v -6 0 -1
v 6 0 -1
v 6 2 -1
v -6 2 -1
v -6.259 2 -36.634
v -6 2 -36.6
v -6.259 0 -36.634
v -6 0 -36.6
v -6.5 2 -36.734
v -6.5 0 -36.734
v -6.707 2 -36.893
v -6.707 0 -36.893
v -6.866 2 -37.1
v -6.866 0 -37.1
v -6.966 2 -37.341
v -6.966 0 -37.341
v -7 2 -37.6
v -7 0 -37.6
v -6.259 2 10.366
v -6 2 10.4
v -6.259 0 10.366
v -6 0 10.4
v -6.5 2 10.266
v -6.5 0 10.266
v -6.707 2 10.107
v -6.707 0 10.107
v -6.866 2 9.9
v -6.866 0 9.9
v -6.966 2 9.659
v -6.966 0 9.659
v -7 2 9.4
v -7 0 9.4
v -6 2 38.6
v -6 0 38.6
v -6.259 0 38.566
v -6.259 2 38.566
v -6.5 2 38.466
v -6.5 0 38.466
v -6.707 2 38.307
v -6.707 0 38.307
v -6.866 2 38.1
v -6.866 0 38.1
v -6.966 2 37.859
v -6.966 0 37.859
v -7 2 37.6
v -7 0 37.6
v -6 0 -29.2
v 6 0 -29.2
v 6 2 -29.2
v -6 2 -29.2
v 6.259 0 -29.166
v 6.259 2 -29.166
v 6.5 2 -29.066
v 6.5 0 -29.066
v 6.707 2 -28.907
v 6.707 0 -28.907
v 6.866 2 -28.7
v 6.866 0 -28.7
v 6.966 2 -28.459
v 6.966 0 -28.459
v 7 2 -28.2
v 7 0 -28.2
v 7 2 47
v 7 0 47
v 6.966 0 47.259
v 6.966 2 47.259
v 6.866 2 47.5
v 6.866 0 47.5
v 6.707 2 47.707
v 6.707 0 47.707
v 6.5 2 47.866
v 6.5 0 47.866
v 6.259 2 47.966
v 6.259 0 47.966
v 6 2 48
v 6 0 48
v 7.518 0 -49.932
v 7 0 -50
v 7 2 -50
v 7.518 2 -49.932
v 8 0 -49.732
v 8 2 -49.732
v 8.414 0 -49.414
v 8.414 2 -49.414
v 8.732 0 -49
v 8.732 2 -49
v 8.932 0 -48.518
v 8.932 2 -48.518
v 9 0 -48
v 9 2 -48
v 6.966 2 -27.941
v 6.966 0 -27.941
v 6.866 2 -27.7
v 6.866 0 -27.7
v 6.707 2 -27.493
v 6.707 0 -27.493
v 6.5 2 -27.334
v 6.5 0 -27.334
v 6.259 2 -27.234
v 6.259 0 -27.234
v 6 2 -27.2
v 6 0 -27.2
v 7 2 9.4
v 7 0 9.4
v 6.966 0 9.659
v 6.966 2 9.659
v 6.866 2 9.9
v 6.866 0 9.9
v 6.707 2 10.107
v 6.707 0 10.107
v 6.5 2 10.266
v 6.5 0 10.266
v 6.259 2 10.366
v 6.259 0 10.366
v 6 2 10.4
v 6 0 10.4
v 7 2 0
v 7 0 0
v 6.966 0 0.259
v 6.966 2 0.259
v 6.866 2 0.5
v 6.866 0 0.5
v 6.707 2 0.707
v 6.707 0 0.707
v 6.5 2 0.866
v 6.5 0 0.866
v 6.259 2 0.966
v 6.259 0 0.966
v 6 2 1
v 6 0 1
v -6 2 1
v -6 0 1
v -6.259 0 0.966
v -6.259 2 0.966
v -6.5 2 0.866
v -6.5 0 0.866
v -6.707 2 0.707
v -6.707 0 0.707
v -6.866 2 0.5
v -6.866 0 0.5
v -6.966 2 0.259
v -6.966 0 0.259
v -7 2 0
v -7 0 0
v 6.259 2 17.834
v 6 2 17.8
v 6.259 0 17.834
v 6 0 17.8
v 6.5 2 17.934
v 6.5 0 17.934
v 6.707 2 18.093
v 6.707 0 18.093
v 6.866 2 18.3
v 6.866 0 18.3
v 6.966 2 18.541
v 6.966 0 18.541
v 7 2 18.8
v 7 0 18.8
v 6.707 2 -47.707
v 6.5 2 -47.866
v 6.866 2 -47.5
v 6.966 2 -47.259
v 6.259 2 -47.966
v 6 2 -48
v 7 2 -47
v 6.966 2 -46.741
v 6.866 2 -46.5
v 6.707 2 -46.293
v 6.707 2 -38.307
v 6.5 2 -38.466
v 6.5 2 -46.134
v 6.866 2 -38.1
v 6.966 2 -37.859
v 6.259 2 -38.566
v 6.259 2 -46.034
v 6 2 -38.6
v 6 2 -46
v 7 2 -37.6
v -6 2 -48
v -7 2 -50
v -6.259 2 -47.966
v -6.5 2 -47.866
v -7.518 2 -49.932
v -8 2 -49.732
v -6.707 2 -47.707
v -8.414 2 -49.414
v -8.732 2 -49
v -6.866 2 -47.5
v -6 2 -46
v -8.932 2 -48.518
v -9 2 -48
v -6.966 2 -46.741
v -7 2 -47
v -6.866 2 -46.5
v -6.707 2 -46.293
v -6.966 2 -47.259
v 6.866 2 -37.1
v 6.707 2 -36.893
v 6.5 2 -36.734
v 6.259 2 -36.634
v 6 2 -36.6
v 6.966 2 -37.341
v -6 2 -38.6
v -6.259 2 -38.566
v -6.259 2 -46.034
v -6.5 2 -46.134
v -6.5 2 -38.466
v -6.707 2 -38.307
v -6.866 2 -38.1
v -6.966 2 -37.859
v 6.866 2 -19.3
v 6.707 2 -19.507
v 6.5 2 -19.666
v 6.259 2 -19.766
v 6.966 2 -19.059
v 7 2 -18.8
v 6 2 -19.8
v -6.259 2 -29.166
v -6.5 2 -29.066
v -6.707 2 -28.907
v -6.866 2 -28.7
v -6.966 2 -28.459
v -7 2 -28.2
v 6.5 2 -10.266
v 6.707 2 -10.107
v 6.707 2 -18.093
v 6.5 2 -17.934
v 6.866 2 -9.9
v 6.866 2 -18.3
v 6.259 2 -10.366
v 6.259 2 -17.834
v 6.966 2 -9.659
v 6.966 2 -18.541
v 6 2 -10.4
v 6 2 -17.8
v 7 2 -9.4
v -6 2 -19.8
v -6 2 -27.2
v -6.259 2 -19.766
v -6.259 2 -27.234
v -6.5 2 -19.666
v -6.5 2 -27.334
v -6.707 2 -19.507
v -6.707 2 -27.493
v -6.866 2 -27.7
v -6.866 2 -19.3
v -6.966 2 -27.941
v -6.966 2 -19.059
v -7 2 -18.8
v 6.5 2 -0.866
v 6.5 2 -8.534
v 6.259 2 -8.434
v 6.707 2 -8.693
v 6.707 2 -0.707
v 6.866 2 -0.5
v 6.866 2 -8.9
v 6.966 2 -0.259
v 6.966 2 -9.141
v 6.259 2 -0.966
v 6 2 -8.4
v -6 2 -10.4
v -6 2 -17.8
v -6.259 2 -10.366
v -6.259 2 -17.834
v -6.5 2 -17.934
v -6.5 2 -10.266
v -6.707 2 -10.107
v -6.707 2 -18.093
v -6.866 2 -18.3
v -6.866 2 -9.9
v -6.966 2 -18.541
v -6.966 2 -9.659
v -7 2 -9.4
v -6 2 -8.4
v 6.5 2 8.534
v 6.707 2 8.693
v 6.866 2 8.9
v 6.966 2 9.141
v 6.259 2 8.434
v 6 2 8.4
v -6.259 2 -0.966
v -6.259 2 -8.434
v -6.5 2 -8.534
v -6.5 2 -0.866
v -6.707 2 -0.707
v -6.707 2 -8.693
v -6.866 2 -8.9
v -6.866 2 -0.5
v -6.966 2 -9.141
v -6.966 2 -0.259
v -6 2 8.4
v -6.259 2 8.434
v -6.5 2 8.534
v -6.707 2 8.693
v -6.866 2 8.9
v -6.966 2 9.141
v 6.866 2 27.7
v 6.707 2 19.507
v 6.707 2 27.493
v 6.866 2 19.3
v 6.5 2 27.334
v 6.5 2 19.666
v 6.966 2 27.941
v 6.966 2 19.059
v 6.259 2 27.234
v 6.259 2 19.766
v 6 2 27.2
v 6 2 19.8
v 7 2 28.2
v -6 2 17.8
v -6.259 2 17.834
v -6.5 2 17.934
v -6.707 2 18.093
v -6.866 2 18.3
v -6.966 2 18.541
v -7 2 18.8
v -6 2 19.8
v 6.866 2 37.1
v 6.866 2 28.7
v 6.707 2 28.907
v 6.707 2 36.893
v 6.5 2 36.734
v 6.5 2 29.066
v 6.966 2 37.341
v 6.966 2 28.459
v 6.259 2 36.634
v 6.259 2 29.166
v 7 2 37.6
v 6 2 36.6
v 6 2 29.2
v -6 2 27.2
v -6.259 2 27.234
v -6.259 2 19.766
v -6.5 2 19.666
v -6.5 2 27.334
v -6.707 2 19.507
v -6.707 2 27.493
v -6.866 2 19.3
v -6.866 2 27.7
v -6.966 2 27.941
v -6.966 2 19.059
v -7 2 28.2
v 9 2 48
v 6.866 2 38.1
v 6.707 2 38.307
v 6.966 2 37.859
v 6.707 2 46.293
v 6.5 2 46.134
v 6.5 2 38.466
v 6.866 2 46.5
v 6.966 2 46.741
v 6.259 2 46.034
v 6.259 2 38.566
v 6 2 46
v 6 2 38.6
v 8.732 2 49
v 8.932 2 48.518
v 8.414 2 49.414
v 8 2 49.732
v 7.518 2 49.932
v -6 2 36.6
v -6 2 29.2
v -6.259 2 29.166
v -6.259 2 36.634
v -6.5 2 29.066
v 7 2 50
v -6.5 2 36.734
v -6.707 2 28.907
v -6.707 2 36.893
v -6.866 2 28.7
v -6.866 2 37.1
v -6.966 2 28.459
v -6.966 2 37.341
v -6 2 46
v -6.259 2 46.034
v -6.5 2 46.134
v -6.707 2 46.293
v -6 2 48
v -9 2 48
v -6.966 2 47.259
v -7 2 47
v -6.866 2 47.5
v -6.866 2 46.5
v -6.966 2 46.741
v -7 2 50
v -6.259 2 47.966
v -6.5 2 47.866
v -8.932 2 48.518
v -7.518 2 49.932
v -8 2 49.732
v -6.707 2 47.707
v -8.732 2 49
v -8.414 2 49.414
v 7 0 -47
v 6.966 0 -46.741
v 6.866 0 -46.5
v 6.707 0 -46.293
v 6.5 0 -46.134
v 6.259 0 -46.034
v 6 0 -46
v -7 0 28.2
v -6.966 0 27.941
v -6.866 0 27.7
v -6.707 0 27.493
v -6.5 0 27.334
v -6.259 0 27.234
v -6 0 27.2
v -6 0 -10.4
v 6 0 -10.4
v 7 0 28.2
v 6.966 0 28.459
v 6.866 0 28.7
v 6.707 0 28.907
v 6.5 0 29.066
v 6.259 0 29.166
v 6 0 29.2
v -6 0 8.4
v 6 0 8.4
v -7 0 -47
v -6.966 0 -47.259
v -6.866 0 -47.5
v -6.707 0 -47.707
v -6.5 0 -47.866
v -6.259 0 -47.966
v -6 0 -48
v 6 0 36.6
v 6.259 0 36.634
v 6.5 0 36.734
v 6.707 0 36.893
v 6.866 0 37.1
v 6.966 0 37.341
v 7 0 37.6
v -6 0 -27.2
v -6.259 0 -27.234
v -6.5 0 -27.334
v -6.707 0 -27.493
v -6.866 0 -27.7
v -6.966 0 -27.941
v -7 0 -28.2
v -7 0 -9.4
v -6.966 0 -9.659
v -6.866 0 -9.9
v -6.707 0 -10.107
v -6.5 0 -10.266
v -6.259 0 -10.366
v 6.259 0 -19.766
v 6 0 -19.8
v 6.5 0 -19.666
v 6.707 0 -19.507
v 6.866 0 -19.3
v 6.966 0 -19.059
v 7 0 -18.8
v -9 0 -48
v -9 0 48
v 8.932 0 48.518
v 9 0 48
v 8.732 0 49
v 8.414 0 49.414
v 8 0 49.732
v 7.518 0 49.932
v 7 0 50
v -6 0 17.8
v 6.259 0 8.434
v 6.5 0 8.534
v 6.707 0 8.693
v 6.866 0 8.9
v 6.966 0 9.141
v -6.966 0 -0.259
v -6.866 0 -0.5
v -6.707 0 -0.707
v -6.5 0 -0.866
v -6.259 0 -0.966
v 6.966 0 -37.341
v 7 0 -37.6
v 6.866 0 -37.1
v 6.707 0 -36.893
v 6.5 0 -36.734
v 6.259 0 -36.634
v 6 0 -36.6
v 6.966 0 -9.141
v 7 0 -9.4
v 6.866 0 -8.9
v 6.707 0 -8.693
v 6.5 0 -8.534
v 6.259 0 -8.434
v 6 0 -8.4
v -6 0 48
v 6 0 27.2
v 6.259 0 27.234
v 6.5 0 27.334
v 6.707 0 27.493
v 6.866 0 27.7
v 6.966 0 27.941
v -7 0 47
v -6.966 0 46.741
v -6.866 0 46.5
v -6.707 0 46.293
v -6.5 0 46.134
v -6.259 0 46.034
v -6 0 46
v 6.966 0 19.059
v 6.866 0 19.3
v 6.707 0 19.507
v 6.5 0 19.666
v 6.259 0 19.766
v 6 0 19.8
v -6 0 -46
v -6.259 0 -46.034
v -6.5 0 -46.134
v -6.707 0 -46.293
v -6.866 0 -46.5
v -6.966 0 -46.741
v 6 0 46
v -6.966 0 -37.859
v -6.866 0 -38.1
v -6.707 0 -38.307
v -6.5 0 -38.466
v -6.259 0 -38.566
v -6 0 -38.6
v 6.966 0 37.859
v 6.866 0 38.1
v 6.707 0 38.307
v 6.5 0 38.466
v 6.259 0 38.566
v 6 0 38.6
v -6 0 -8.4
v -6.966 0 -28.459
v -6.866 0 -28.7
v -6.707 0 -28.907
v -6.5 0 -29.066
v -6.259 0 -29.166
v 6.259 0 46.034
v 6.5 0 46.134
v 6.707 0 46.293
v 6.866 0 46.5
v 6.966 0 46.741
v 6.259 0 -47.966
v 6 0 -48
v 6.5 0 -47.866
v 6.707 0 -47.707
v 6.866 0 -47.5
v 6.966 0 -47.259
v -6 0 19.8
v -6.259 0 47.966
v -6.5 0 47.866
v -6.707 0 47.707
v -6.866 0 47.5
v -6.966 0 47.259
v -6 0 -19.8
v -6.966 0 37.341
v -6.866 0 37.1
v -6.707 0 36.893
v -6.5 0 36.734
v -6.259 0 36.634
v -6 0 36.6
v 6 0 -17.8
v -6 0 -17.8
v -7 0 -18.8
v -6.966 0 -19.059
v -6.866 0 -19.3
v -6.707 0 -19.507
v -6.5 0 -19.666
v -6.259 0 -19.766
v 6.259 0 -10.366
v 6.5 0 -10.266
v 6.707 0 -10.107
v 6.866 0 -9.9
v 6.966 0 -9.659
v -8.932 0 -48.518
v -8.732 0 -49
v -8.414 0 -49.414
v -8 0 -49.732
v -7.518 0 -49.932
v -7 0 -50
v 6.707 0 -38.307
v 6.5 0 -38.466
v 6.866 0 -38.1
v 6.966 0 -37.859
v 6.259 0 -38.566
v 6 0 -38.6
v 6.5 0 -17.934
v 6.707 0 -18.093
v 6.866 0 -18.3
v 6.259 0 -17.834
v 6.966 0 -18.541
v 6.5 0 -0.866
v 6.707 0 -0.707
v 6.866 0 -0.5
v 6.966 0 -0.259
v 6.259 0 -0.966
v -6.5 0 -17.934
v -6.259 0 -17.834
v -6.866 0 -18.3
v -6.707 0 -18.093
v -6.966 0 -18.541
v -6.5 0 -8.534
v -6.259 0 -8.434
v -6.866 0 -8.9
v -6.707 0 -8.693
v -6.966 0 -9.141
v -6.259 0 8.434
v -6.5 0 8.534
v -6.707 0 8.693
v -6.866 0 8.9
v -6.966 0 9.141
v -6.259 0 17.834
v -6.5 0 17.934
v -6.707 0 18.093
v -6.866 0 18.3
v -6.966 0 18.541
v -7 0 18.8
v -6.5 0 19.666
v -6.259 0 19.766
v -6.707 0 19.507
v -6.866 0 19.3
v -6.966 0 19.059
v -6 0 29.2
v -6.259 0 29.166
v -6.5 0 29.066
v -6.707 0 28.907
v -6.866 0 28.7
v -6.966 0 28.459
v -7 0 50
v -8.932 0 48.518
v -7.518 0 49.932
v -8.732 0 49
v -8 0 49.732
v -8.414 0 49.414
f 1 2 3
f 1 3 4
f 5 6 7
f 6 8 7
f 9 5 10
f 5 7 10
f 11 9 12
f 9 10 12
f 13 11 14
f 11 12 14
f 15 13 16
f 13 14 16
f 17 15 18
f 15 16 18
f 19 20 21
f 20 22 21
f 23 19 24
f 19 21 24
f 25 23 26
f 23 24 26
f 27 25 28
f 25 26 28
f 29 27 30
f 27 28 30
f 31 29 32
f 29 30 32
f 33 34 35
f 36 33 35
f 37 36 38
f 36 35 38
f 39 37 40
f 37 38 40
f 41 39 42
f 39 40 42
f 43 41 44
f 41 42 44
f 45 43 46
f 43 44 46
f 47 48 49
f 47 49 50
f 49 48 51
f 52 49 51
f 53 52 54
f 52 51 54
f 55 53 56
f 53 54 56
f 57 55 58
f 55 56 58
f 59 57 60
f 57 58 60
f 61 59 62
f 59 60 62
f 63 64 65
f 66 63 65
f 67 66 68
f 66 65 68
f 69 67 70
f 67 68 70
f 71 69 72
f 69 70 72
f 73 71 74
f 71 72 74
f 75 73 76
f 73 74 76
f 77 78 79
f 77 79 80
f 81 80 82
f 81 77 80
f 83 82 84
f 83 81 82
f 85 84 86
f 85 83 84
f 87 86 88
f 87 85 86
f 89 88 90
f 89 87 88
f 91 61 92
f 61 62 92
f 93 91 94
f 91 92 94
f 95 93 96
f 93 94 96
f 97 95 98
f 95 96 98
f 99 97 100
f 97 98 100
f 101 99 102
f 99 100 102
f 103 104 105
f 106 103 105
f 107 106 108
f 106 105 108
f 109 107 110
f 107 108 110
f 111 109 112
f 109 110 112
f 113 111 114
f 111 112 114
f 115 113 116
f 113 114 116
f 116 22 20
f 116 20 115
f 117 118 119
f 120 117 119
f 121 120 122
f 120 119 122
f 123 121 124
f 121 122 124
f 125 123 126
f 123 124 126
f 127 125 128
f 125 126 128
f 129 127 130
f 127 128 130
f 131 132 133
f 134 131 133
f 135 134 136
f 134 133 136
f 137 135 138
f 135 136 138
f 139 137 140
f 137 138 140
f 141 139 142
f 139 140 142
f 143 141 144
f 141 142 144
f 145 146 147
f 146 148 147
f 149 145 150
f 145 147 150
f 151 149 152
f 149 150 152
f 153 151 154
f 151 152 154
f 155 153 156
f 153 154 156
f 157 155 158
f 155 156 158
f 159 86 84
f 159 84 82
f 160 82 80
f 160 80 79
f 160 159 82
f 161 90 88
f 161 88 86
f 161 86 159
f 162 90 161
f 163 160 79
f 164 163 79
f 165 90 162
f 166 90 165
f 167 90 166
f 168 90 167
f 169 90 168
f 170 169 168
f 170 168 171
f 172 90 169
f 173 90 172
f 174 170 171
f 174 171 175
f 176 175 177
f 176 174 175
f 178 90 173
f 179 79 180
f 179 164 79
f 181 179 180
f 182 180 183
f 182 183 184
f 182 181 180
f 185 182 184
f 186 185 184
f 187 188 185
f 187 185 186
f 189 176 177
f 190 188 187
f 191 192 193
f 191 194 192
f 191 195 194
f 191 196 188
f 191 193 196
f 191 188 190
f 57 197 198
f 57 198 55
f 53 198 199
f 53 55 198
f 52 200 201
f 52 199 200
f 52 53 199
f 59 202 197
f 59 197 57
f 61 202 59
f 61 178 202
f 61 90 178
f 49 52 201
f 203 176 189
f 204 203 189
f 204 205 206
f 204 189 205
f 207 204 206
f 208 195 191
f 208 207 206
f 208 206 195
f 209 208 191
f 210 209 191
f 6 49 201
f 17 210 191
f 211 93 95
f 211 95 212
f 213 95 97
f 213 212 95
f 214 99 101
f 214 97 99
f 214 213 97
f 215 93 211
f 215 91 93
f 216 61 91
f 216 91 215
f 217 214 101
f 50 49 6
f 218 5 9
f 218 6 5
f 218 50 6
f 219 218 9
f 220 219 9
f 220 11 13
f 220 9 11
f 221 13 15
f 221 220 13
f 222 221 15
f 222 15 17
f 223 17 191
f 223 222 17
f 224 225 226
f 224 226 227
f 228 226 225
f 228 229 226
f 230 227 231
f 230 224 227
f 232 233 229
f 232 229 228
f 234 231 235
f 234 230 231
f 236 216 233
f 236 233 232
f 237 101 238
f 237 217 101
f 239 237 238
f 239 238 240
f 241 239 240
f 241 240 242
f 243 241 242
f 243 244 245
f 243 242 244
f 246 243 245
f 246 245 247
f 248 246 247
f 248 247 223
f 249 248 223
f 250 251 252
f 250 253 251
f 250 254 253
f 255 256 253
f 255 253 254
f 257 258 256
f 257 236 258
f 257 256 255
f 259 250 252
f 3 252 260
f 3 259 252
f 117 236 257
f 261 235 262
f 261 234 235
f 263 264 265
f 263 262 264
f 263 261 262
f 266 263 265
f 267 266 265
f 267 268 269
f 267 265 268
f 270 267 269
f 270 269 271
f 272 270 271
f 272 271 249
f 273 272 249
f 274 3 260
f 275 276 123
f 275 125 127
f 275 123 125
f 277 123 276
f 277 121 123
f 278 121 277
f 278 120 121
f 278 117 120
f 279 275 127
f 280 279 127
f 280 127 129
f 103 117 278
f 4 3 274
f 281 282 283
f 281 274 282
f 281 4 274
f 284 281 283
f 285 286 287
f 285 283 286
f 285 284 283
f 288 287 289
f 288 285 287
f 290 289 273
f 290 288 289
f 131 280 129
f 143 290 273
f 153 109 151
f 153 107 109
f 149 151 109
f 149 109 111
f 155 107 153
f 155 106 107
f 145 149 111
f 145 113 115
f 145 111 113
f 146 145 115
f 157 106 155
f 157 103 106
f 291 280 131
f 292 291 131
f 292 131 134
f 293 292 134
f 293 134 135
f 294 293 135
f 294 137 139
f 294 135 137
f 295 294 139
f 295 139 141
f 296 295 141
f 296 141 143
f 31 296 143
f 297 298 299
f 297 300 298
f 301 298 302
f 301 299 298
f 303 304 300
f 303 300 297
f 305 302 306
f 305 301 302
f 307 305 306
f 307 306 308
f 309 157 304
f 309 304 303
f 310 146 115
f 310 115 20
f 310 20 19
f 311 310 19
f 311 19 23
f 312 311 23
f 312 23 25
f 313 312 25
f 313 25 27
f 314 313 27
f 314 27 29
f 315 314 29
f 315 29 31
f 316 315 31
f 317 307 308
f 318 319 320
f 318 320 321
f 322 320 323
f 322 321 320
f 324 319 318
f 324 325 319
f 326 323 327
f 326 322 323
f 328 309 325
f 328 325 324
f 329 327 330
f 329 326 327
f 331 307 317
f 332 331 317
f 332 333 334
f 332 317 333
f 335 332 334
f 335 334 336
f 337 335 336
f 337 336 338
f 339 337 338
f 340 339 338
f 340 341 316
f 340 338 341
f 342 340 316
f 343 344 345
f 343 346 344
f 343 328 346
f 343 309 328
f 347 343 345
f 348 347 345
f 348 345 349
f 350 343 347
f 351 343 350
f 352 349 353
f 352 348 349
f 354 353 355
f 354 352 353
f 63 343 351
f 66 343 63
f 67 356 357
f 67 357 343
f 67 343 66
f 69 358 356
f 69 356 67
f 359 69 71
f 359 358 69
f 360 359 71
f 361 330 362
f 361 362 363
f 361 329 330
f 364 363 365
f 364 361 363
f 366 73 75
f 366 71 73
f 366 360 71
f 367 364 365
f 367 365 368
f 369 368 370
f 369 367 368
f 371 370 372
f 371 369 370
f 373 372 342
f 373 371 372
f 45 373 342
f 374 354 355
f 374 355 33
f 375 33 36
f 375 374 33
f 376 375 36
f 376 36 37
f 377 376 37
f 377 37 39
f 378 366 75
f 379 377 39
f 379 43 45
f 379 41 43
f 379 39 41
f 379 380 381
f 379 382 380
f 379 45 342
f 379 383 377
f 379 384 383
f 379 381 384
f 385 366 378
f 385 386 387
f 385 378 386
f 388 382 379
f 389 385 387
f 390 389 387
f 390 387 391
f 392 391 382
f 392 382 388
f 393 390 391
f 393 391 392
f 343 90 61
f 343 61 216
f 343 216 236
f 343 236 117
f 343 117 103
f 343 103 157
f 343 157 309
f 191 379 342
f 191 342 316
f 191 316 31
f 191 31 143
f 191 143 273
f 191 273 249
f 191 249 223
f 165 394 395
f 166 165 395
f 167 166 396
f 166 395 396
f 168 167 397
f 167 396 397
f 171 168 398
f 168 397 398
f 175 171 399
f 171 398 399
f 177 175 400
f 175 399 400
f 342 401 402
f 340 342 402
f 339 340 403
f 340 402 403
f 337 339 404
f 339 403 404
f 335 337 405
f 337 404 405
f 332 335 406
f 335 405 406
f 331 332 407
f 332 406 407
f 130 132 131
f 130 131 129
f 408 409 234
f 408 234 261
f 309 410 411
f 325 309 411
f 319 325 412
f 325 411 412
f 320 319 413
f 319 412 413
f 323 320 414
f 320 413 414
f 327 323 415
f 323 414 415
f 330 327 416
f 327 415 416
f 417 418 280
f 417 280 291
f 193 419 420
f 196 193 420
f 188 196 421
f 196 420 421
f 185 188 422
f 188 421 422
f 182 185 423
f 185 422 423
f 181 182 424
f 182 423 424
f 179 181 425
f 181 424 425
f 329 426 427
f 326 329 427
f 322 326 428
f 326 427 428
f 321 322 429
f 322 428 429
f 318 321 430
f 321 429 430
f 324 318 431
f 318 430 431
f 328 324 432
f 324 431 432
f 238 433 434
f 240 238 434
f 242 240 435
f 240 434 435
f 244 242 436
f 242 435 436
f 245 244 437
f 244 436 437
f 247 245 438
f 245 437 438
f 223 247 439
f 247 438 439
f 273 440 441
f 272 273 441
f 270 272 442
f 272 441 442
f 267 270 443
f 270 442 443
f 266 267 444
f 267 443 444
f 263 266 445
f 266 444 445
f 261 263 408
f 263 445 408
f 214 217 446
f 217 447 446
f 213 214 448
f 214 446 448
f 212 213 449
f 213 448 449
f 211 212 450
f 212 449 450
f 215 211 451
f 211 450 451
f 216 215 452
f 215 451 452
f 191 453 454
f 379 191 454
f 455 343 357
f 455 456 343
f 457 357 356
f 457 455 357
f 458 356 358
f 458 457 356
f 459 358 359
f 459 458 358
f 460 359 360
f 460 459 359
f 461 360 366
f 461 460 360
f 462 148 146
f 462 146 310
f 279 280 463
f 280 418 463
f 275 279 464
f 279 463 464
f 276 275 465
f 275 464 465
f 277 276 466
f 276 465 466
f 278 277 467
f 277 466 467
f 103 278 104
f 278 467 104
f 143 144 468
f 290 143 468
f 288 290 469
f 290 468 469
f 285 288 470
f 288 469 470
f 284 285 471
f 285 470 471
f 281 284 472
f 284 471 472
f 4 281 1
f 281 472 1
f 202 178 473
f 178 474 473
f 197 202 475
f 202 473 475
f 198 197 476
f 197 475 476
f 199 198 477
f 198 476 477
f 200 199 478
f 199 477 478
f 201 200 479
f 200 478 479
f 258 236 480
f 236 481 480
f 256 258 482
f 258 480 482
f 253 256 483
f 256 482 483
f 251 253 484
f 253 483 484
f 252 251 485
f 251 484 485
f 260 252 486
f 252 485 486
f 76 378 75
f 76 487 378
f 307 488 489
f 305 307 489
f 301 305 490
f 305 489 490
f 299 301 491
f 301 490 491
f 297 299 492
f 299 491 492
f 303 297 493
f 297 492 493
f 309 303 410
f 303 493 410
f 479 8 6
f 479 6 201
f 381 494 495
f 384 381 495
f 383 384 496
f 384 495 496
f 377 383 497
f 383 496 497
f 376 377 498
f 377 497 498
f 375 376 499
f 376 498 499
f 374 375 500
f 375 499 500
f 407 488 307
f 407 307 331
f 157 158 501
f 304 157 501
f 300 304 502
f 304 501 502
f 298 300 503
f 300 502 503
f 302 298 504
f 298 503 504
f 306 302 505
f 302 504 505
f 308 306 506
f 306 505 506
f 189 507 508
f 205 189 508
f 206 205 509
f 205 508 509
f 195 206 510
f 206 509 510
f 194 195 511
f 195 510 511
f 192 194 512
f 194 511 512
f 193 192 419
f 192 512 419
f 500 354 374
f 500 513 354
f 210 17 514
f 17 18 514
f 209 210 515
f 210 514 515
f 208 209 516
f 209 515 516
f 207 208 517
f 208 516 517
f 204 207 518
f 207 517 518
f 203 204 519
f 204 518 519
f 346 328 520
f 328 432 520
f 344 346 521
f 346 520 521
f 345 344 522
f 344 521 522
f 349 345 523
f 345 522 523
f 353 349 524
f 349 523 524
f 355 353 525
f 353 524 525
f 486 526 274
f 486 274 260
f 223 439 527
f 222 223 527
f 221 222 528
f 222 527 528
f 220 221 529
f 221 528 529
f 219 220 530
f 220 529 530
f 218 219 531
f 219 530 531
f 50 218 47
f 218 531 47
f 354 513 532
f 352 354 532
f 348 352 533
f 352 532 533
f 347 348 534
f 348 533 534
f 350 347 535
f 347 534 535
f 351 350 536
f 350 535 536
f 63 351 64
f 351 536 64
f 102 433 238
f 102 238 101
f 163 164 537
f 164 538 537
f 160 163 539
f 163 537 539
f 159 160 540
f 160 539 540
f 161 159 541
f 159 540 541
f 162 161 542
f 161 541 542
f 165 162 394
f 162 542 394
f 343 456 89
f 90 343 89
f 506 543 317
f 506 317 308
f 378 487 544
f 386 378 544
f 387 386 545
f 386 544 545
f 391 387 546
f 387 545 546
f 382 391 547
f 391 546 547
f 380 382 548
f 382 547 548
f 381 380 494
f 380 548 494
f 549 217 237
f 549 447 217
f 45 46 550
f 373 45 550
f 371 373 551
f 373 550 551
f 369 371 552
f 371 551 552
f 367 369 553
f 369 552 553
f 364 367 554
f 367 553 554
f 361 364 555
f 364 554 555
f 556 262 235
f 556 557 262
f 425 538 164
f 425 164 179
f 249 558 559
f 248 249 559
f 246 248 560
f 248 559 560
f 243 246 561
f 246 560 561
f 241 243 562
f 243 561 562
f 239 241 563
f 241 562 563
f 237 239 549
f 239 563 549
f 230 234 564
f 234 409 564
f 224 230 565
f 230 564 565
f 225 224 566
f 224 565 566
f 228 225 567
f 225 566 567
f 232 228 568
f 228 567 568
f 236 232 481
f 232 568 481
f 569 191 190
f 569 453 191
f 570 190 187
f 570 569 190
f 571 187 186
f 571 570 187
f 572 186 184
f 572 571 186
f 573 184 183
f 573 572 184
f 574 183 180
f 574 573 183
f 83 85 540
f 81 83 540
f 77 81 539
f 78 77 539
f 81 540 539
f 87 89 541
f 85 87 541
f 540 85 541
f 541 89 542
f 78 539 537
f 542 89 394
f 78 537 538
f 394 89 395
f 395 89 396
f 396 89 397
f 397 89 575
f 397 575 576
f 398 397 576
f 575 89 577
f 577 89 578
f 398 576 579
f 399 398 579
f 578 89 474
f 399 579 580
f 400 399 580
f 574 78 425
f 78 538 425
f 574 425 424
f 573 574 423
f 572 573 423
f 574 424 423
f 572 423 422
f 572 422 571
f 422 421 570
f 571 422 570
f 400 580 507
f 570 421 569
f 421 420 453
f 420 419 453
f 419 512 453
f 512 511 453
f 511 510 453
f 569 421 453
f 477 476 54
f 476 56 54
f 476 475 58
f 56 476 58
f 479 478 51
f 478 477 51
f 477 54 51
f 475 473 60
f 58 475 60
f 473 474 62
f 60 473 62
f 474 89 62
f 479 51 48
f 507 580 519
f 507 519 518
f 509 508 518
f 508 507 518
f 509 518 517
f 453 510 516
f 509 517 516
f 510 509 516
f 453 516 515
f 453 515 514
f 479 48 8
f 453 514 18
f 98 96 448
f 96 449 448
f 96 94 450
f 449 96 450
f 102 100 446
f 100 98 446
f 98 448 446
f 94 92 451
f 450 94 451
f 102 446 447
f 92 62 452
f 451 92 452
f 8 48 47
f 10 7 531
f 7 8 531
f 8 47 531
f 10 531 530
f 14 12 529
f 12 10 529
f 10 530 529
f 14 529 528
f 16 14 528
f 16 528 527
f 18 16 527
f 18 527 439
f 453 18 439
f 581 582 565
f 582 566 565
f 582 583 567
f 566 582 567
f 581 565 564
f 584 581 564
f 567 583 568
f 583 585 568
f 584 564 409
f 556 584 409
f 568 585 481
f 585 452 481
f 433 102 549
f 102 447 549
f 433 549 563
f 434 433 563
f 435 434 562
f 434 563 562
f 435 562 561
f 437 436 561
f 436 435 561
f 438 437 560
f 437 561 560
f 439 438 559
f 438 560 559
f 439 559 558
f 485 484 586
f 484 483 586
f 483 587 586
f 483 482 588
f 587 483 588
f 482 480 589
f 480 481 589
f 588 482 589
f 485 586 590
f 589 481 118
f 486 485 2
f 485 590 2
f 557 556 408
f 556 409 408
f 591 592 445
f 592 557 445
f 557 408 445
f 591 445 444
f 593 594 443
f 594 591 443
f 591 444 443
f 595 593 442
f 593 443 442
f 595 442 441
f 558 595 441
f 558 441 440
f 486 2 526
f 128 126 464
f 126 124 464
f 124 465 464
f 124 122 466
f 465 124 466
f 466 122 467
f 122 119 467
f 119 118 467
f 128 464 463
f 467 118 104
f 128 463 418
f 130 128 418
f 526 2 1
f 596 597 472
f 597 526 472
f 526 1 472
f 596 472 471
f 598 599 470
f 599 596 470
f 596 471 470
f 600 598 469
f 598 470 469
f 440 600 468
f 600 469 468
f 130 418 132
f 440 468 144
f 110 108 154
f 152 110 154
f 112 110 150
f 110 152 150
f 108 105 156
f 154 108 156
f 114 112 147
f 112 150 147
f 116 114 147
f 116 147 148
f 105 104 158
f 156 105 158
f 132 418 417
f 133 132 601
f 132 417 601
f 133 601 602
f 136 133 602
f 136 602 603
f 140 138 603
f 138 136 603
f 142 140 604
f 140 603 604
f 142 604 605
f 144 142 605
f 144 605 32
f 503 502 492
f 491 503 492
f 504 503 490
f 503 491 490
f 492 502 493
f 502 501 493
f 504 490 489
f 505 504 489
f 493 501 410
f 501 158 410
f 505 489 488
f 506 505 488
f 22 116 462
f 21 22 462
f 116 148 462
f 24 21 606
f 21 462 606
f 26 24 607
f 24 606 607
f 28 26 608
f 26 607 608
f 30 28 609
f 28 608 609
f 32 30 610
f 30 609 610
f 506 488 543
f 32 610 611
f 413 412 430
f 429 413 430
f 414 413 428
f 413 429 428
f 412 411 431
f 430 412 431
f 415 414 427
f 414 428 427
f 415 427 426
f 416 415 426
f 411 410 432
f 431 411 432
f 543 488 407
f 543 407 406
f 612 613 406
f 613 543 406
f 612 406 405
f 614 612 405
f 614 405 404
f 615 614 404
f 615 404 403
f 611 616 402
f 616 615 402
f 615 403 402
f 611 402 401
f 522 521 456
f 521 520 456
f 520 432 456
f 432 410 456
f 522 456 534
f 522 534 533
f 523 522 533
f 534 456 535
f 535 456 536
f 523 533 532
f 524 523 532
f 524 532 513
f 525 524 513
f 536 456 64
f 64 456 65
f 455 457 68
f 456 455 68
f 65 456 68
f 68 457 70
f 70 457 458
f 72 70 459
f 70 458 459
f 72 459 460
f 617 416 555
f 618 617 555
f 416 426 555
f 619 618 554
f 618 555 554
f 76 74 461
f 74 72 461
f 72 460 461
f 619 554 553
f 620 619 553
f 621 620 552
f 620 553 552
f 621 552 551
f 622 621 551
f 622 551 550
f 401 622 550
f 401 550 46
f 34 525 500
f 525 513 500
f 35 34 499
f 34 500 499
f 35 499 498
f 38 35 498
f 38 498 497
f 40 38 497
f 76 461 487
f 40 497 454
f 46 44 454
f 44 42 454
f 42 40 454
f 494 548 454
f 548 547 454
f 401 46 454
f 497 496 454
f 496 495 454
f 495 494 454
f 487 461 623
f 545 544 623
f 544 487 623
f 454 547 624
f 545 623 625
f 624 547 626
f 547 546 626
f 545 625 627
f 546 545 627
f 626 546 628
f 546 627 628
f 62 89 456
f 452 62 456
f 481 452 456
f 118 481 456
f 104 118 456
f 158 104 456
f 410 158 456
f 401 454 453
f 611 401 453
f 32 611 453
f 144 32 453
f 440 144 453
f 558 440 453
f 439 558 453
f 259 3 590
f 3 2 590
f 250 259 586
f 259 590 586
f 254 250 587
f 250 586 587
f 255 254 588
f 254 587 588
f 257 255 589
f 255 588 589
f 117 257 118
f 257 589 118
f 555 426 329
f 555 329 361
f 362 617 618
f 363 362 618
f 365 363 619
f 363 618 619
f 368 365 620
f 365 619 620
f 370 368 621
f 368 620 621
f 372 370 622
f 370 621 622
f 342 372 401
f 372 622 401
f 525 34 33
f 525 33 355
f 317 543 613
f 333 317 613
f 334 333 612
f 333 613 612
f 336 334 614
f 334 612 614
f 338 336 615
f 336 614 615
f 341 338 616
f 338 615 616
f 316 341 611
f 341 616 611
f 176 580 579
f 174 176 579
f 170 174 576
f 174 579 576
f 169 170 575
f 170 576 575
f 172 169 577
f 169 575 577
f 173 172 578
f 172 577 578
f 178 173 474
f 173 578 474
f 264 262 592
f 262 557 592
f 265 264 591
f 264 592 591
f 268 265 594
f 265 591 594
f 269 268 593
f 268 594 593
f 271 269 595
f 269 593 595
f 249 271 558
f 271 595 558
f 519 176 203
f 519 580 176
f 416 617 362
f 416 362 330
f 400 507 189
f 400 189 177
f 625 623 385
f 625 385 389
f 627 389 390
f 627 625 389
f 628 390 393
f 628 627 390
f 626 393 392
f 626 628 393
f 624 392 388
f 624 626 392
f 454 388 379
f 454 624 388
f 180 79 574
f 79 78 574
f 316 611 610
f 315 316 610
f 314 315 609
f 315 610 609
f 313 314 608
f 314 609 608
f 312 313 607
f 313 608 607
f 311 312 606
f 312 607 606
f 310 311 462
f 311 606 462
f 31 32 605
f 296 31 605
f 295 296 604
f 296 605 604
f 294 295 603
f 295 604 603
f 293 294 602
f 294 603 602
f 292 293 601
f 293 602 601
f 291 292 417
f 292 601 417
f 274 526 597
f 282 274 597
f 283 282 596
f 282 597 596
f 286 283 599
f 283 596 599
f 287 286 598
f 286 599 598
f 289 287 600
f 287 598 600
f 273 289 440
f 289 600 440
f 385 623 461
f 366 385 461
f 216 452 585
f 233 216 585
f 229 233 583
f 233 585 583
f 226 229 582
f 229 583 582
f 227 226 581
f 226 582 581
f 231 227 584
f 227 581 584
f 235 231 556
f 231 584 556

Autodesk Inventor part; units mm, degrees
ref_plane "YZ Plane" through (0, 0, 0) normal (1, 0, 0) x (0, 1, 0)
ref_plane "XZ Plane" through (0, 0, 0) normal (0, 1, 0) x (-1, 0, 0)
ref_plane "XY Plane" through (0, 0, 0) normal (0, 0, 1) x (1, 0, 0)
sketch "Sketch1" plane through (0, 0, 0) normal (0, 1, 0) x (-1, 0, 0)
  line L0 (-9, 48) -> (-9, -48)
  line L1 (-7, -50) -> (7, -50)
  line L2 (9, -48) -> (9, 48)
  line L3 (7, 50) -> (-7, 50)
  line L4 (-9, 50) -> (9, -50) construction
  line L5 (-9, -50) -> (9, 50) construction
  arc A0 (9, 48) -> (7, 50) centre (7, 48) ccw
  arc A1 (-7, 50) -> (-9, 48) centre (-7, 48) ccw
  arc A2 (-9, -48) -> (-7, -50) centre (-7, -48) ccw
  arc A3 (7, -50) -> (9, -48) centre (7, -48) ccw
  line L6 (-7, 47) -> (-7, 47)
  line L7 (-6, 46) -> (6, 46)
  line L8 (7, 47) -> (7, 47)
  line L9 (6, 48) -> (-6, 48)
  arc A4 (7, 47) -> (6, 48) centre (6, 47) ccw
  arc A5 (6, 46) -> (7, 47) centre (6, 47) ccw
  arc A6 (-6, 48) -> (-7, 47) centre (-6, 47) ccw
  arc A7 (-7, 47) -> (-6, 46) centre (-6, 47) ccw
  line L10 (-7, 37.6) -> (-7, 37.6)
  line L11 (-6, 36.6) -> (6, 36.6)
  line L12 (7, 37.6) -> (7, 37.6)
  line L13 (6, 38.6) -> (-6, 38.6)
  arc A8 (7, 37.6) -> (6, 38.6) centre (6, 37.6) ccw
  arc A9 (6, 36.6) -> (7, 37.6) centre (6, 37.6) ccw
  arc A10 (-6, 38.6) -> (-7, 37.6) centre (-6, 37.6) ccw
  arc A11 (-7, 37.6) -> (-6, 36.6) centre (-6, 37.6) ccw
  line L14 (-7, 28.2) -> (-7, 28.2)
  line L15 (-6, 27.2) -> (6, 27.2)
  line L16 (7, 28.2) -> (7, 28.2)
  line L17 (6, 29.2) -> (-6, 29.2)
  arc A12 (7, 28.2) -> (6, 29.2) centre (6, 28.2) ccw
  arc A13 (6, 27.2) -> (7, 28.2) centre (6, 28.2) ccw
  arc A14 (-6, 29.2) -> (-7, 28.2) centre (-6, 28.2) ccw
  arc A15 (-7, 28.2) -> (-6, 27.2) centre (-6, 28.2) ccw
  line L18 (-7, 18.8) -> (-7, 18.8)
  line L19 (-6, 17.8) -> (6, 17.8)
  line L20 (7, 18.8) -> (7, 18.8)
  line L21 (6, 19.8) -> (-6, 19.8)
  arc A16 (7, 18.8) -> (6, 19.8) centre (6, 18.8) ccw
  arc A17 (6, 17.8) -> (7, 18.8) centre (6, 18.8) ccw
  arc A18 (-6, 19.8) -> (-7, 18.8) centre (-6, 18.8) ccw
  arc A19 (-7, 18.8) -> (-6, 17.8) centre (-6, 18.8) ccw
  line L22 (-7, 9.4) -> (-7, 9.4)
  line L23 (-6, 8.4) -> (6, 8.4)
  line L24 (7, 9.4) -> (7, 9.4)
  line L25 (6, 10.4) -> (-6, 10.4)
  arc A20 (7, 9.4) -> (6, 10.4) centre (6, 9.4) ccw
  arc A21 (6, 8.4) -> (7, 9.4) centre (6, 9.4) ccw
  arc A22 (-6, 10.4) -> (-7, 9.4) centre (-6, 9.4) ccw
  arc A23 (-7, 9.4) -> (-6, 8.4) centre (-6, 9.4) ccw
  line L26 (-7, 0) -> (-7, 0)
  line L27 (-6, -1) -> (6, -1)
  line L28 (7, 0) -> (7, 0)
  line L29 (6, 1) -> (-6, 1)
  arc A24 (7, 0) -> (6, 1) centre (6, 0) ccw
  arc A25 (6, -1) -> (7, 0) centre (6, 0) ccw
  arc A26 (-6, 1) -> (-7, 0) centre (-6, 0) ccw
  arc A27 (-7, 0) -> (-6, -1) centre (-6, 0) ccw
  line L30 (-7, -9.4) -> (-7, -9.4)
  line L31 (-6, -10.4) -> (6, -10.4)
  line L32 (7, -9.4) -> (7, -9.4)
  line L33 (6, -8.4) -> (-6, -8.4)
  arc A28 (7, -9.4) -> (6, -8.4) centre (6, -9.4) ccw
  arc A29 (6, -10.4) -> (7, -9.4) centre (6, -9.4) ccw
  arc A30 (-6, -8.4) -> (-7, -9.4) centre (-6, -9.4) ccw
  arc A31 (-7, -9.4) -> (-6, -10.4) centre (-6, -9.4) ccw
  line L34 (-7, -18.8) -> (-7, -18.8)
  line L35 (-6, -19.8) -> (6, -19.8)
  line L36 (7, -18.8) -> (7, -18.8)
  line L37 (6, -17.8) -> (-6, -17.8)
  arc A32 (7, -18.8) -> (6, -17.8) centre (6, -18.8) ccw
  arc A33 (6, -19.8) -> (7, -18.8) centre (6, -18.8) ccw
  arc A34 (-6, -17.8) -> (-7, -18.8) centre (-6, -18.8) ccw
  arc A35 (-7, -18.8) -> (-6, -19.8) centre (-6, -18.8) ccw
  line L38 (-7, -28.2) -> (-7, -28.2)
  line L39 (-6, -29.2) -> (6, -29.2)
  line L40 (7, -28.2) -> (7, -28.2)
  line L41 (6, -27.2) -> (-6, -27.2)
  arc A36 (7, -28.2) -> (6, -27.2) centre (6, -28.2) ccw
  arc A37 (6, -29.2) -> (7, -28.2) centre (6, -28.2) ccw
  arc A38 (-6, -27.2) -> (-7, -28.2) centre (-6, -28.2) ccw
  arc A39 (-7, -28.2) -> (-6, -29.2) centre (-6, -28.2) ccw
  line L42 (-7, -37.6) -> (-7, -37.6)
  line L43 (-6, -38.6) -> (6, -38.6)
  line L44 (7, -37.6) -> (7, -37.6)
  line L45 (6, -36.6) -> (-6, -36.6)
  arc A40 (7, -37.6) -> (6, -36.6) centre (6, -37.6) ccw
  arc A41 (6, -38.6) -> (7, -37.6) centre (6, -37.6) ccw
  arc A42 (-6, -36.6) -> (-7, -37.6) centre (-6, -37.6) ccw
  arc A43 (-7, -37.6) -> (-6, -38.6) centre (-6, -37.6) ccw
  line L46 (-7, -47) -> (-7, -47)
  line L47 (-6, -48) -> (6, -48)
  line L48 (7, -47) -> (7, -47)
  line L49 (6, -46) -> (-6, -46)
  arc A44 (7, -47) -> (6, -46) centre (6, -47) ccw
  arc A45 (6, -48) -> (7, -47) centre (6, -47) ccw
  arc A46 (-6, -46) -> (-7, -47) centre (-6, -47) ccw
  arc A47 (-7, -47) -> (-6, -48) centre (-6, -47) ccw
  point P0 (0, 0)
  point P1 (-7, 46)
  point P2 (7, 38.6)
  point P3 (-7, 38.6)
  point P4 (-7, 36.6)
  point P5 (7, 29.2)
  point P6 (-7, 29.2)
  point P7 (-7, 27.2)
  point P8 (7, 19.8)
  point P9 (-7, 19.8)
  point P10 (-7, 17.8)
  point P11 (7, 10.4)
  point P12 (-7, 10.4)
  point P13 (-7, 8.4)
  point P14 (7, 1)
  point P15 (-7, 1)
  point P16 (-7, -1)
  point P17 (7, -8.4)
  point P18 (-7, -8.4)
  point P19 (-7, -10.4)
  point P20 (7, -17.8)
  point P21 (-7, -17.8)
  point P22 (-7, -19.8)
  point P23 (7, -27.2)
  point P24 (-7, -27.2)
  point P25 (-7, -29.2)
  point P26 (7, -36.6)
  point P27 (-7, -36.6)
  point P28 (-7, -38.6)
  point P29 (7, -46)
  point P30 (-7, -46)
  point P31 (-7, -48)
  dimension "d0" = 100
  dimension "d1" = 18
  dimension "d2" = 2
  dimension "d3" = 2
  dimension "d4" = 1
  dimension "d5" = 1
  dimension "d8" = 9.4
extrude "Extrusion1" add sketch "Sketch1" along normal blind 2
properties part number "Kicker Plate"
